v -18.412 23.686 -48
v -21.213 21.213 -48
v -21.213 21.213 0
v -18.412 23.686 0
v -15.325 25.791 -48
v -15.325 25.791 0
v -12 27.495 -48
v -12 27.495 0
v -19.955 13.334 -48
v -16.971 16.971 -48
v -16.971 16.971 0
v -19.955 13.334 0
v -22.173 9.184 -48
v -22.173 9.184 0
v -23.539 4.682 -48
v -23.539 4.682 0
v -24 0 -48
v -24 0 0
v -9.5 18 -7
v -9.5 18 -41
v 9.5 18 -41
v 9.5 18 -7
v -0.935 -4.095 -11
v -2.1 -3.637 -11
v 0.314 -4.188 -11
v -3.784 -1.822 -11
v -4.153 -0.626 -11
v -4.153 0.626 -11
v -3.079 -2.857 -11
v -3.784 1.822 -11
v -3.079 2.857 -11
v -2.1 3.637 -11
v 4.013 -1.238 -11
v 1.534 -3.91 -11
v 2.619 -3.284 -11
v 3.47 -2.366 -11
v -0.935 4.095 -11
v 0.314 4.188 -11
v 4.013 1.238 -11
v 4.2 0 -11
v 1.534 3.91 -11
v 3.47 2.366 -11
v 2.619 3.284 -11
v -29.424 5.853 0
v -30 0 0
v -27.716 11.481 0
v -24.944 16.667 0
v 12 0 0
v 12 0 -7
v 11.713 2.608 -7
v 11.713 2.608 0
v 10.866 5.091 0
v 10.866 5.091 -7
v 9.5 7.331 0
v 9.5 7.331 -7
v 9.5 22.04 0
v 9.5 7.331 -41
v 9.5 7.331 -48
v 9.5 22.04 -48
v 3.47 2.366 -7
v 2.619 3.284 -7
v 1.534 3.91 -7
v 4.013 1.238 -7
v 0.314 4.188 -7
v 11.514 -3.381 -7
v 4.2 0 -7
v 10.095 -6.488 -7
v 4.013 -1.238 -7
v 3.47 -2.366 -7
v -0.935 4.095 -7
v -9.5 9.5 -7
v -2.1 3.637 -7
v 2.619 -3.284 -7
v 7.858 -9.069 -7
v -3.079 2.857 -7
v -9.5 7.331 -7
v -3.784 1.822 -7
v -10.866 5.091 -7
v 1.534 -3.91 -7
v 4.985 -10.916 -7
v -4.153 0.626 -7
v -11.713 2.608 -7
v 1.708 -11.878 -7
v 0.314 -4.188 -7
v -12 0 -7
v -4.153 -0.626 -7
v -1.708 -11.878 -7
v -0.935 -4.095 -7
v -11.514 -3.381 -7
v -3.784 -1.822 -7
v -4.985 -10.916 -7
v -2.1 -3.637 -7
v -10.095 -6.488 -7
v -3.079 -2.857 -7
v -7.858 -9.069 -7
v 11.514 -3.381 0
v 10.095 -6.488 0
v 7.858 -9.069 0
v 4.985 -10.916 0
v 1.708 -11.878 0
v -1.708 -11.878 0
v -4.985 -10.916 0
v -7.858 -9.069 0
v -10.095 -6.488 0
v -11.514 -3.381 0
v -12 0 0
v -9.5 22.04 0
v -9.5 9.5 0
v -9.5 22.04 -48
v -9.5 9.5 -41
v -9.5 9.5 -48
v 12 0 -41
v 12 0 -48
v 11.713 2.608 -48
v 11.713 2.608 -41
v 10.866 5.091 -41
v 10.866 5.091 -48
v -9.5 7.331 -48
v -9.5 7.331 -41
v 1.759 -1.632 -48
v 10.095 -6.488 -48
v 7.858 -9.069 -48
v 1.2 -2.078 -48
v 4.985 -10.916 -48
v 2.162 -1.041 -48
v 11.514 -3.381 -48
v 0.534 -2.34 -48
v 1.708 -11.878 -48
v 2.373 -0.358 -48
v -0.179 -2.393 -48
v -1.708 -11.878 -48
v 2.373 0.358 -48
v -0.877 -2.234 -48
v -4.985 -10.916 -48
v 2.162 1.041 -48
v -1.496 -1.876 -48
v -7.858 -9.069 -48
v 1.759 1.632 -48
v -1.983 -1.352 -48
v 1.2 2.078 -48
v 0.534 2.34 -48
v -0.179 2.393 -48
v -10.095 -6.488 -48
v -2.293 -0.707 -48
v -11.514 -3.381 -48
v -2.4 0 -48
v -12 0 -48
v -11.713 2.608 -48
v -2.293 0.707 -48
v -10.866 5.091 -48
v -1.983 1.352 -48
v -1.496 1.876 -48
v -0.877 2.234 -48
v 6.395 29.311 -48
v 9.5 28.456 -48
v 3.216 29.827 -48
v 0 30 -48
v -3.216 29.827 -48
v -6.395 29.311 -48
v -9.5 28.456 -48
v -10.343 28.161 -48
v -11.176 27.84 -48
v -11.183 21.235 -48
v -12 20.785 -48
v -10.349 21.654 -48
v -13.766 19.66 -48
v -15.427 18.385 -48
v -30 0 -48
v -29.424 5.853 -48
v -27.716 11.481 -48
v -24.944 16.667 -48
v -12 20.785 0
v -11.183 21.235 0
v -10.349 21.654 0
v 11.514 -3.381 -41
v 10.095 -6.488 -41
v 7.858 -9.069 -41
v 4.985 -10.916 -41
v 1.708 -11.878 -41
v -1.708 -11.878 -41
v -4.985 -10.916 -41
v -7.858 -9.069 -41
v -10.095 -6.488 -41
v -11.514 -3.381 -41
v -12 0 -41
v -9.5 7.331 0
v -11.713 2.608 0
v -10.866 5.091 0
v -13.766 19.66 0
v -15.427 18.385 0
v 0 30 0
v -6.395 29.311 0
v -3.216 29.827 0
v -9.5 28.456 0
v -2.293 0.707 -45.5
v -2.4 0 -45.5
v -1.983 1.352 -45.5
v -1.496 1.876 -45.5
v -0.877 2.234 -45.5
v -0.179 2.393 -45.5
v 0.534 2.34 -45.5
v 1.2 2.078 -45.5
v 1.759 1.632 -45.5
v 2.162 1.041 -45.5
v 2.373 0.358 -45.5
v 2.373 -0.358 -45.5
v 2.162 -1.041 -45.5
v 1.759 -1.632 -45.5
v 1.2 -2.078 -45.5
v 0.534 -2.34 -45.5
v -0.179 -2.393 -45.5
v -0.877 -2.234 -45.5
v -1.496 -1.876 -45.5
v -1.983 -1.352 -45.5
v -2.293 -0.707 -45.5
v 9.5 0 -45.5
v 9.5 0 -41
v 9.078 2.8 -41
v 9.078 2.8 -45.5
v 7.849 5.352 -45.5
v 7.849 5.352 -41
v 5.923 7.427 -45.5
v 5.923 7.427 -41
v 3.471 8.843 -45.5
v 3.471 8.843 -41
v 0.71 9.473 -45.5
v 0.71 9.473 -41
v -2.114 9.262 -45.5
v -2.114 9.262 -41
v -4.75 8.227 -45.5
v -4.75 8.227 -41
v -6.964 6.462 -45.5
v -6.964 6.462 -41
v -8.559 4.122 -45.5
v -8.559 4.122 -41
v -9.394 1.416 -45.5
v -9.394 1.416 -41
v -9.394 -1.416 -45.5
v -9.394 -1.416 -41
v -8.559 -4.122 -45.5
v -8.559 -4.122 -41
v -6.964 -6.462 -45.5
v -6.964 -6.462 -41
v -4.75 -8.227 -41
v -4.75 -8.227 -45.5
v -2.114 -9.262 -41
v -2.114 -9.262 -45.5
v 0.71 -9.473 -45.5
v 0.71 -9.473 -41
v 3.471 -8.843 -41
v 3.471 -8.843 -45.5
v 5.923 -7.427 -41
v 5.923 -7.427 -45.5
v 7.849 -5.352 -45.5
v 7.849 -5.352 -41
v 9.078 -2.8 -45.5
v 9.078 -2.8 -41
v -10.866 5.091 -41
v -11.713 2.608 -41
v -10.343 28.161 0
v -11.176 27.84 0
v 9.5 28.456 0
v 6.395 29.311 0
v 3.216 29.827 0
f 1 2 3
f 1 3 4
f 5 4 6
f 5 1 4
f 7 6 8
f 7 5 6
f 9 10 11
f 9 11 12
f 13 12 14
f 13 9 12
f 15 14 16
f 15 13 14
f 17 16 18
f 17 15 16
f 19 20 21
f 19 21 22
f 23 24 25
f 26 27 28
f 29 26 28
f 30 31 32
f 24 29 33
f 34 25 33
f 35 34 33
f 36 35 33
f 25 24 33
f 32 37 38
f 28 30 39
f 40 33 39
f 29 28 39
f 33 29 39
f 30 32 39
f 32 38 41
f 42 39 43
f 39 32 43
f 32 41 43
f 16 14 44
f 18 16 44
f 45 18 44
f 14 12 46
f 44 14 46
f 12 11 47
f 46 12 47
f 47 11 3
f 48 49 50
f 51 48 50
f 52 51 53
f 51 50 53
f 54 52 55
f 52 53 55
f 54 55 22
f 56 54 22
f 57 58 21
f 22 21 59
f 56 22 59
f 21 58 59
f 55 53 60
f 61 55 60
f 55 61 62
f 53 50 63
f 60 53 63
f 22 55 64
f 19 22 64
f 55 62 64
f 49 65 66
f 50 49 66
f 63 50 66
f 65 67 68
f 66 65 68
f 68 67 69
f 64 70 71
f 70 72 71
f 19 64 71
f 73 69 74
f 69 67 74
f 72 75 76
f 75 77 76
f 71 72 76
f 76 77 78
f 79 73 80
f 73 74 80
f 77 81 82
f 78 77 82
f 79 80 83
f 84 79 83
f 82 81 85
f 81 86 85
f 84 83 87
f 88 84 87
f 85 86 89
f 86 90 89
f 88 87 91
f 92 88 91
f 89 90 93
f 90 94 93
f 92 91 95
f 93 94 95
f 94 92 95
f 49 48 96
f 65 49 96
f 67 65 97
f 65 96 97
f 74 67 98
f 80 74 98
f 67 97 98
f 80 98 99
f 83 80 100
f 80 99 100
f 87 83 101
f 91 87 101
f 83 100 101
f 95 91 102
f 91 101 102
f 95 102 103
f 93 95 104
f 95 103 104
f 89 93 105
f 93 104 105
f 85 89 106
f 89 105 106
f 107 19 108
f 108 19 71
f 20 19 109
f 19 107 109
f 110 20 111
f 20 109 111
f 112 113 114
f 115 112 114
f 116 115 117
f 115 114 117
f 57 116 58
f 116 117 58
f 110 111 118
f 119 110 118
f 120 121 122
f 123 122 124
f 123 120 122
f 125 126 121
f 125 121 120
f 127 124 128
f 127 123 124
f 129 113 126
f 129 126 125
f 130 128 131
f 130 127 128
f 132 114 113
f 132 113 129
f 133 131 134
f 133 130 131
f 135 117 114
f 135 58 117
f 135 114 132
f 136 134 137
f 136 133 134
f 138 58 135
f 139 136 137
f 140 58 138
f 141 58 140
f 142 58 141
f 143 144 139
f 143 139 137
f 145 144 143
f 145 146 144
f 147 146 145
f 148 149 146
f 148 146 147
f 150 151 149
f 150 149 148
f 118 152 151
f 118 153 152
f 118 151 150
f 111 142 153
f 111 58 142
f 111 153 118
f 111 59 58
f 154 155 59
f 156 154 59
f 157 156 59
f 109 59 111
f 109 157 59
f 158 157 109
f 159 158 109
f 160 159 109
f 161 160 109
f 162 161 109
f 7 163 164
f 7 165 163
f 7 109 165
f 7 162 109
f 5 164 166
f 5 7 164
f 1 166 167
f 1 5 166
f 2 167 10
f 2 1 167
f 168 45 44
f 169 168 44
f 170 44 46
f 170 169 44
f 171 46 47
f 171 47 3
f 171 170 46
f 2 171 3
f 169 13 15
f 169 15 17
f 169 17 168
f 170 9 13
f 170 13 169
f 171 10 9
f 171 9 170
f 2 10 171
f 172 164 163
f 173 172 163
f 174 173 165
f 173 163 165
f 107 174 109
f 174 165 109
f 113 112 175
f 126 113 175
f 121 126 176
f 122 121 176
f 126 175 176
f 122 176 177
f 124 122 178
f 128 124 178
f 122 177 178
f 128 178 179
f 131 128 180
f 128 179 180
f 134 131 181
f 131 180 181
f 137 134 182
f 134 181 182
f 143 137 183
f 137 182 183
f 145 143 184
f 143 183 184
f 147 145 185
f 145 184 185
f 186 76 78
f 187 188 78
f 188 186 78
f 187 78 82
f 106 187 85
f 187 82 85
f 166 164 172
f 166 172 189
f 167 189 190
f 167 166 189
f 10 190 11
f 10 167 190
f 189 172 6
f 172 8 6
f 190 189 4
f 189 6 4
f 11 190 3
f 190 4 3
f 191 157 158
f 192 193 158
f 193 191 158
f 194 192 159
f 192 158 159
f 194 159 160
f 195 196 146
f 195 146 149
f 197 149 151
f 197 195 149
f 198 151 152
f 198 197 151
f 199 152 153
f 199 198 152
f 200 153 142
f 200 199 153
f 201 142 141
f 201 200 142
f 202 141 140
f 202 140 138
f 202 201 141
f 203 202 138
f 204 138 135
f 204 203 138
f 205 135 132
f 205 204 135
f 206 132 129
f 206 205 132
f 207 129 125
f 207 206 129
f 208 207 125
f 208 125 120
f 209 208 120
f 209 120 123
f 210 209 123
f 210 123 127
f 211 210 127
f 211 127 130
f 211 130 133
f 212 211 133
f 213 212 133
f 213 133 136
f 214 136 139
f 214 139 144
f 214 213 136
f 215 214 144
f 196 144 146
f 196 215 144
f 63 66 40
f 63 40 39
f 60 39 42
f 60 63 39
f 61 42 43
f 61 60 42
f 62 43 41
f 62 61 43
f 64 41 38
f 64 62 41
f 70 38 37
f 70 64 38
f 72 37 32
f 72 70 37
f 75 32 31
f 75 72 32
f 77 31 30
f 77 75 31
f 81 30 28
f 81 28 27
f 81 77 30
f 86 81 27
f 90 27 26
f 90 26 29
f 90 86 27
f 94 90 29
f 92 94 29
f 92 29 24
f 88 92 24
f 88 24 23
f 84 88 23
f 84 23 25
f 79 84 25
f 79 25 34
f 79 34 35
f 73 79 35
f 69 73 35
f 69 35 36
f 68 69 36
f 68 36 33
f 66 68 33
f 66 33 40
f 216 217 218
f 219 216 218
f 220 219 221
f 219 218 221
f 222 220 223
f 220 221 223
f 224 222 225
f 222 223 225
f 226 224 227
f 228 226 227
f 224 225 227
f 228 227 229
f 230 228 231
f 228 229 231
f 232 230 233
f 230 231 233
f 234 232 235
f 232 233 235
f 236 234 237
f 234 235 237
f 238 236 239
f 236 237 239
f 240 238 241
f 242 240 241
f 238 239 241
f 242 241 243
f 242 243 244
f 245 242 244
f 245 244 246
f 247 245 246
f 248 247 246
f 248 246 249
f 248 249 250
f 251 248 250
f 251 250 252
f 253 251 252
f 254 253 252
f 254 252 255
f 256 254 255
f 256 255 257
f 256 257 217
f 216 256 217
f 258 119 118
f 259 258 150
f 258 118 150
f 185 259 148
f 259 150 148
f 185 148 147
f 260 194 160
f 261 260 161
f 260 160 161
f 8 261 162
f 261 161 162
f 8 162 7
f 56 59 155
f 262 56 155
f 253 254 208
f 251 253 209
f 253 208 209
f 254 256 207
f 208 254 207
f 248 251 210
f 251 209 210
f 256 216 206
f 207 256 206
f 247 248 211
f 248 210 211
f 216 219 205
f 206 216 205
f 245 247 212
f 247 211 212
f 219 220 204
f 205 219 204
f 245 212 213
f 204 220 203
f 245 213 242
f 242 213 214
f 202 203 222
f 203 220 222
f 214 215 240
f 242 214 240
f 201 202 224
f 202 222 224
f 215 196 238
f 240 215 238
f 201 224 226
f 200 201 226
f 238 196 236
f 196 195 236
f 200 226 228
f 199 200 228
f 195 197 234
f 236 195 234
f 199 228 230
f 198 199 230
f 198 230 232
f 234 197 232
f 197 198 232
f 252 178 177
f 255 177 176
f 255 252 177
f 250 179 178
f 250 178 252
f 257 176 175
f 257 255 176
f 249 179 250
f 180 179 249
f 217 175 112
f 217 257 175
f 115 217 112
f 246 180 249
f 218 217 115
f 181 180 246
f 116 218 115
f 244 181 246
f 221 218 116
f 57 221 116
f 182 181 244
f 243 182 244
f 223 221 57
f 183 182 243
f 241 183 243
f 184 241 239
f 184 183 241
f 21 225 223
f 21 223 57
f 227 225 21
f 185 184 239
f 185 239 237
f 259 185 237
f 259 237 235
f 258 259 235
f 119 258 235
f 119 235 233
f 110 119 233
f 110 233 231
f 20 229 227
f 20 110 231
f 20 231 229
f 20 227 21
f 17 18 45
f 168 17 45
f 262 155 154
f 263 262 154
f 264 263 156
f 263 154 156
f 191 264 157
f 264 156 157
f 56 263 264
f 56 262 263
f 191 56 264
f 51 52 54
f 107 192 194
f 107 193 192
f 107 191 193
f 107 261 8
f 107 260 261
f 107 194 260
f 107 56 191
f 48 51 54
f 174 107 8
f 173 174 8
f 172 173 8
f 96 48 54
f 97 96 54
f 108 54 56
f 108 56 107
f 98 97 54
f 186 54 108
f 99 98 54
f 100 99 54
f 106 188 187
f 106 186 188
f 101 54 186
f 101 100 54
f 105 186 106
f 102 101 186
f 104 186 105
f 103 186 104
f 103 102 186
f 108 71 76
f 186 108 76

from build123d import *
from build123d.topology import SkipClean

# Parameters (mm, degrees)
SKETCH1_R           = 9.5
BOSS_EXTRUDE1_DEPTH = 48
SKETCH2_W           = 34
SKETCH2_H           = 30
CUT_EXTRUDE1_DEPTH  = 62.481704596
BOSS_EXTRUDE2_START = -2.5
SKETCH3_R           = 9.5
SKETCH3_R_2         = 2.4
BOSS_EXTRUDE2_DEPTH = 2.5
SKETCH4_R           = 9.5
SKETCH4_R_2         = 4.2
BOSS_EXTRUDE3_DEPTH = 7
SKETCH5_R           = 4.2
BOSS_EXTRUDE4_DEPTH = 11
CUT_EXTRUDE2_DEPTH  = 58.861904566
BOSS_EXTRUDE5_DEPTH = 48


with BuildPart() as part:
    # Sketch1 → Boss-Extrude1 (new body)
    with BuildSketch(Plane.XY):
        with BuildLine():
            Line((-12, 0), (-12, 30))
            Line((-12, 30), (12, 30))
            Line((12, 30), (12, 0))
            ThreePointArc((12, 0), (0, -12), (-12, 0))
        make_face()
        Circle(SKETCH1_R, mode=Mode.SUBTRACT)
    extrude(amount=-BOSS_EXTRUDE1_DEPTH)

    # Sketch2 → Cut-Extrude1 (cut, through all)
    with BuildSketch(Plane.ZY.offset(12)):
        with Locations((-24, 3)):
            Rectangle(SKETCH2_W, SKETCH2_H)
    extrude(amount=-CUT_EXTRUDE1_DEPTH, mode=Mode.SUBTRACT)

    # Sketch3 → Boss-Extrude2 (add)
    with BuildSketch(Plane(origin=(0, 0, -48), x_dir=(-1, 0, 0), z_dir=(0, 0, -1)).offset(BOSS_EXTRUDE2_START)):
        Circle(SKETCH3_R)
        Circle(SKETCH3_R_2, mode=Mode.SUBTRACT)
    extrude(amount=BOSS_EXTRUDE2_DEPTH)

    # Sketch4 → Boss-Extrude3 (add)
    with BuildSketch(Plane.XY):
        with Locations(Location((0, 0, 0), (0, 0, 180))):
            Circle(SKETCH4_R)
        Circle(SKETCH4_R_2, mode=Mode.SUBTRACT)
    extrude(amount=-BOSS_EXTRUDE3_DEPTH)

    # Sketch5 → Boss-Extrude4 (add)
    with BuildSketch(Plane.XY):
        Circle(SKETCH5_R)
    extrude(amount=-BOSS_EXTRUDE4_DEPTH)

    # Sketch6 → Cut-Extrude2 (cut, through all)
    with SkipClean():  # the faces are left unmerged after this step: merging them gives an invalid solid
        with BuildSketch(Plane(origin=(0, 0, -48), x_dir=(-1, 0, 0), z_dir=(0, 0, -1))):
            with BuildLine():
                Line((-12, 30), (-12, 27.49545417))
                ThreePointArc((-12, 27.49545417), (-10.760725498, 28.003692377), (-9.5, 28.45610655))
                Line((-9.5, 28.45610655), (-9.5, 30))
                Line((-9.5, 30), (-12, 30))
            make_face()
            with BuildLine():
                Line((-9.5, 30), (-9.5, 28.45610655))
                ThreePointArc((-9.5, 28.45610655), (-4.812317696, 29.611511248), (2.9e-08, 30))
                Line((2.9e-08, 30), (-9.5, 30))
            make_face()
            with BuildLine():
                ThreePointArc((2.9e-08, 30), (4.812317725, 29.611511243), (9.5, 28.45610655))
                Line((9.5, 28.45610655), (9.5, 30))
                Line((9.5, 30), (2.9e-08, 30))
            make_face()
            with BuildLine():
                Line((9.5, 30), (9.5, 28.45610655))
                ThreePointArc((9.5, 28.45610655), (10.760725498, 28.003692377), (12, 27.49545417))
                Line((12, 27.49545417), (12, 30))
                Line((12, 30), (9.5, 30))
            make_face()
            with BuildLine():
                Line((-12, 20.784609691), (-12, 0))
                ThreePointArc((-12, 0), (-11.357816692, 3.872983346), (-9.5, 7.331439149))
                Line((-9.5, 7.331439149), (-9.5, 22.039736841))
                ThreePointArc((-9.5, 22.039736841), (-10.768302375, 21.448628487), (-12, 20.784609691))
            make_face()
            with BuildLine():
                Line((-12, 27.49545417), (-12, 20.784609691))
                ThreePointArc((-12, 20.784609691), (-10.768302375, 21.448628487), (-9.5, 22.039736841))
                Line((-9.5, 22.039736841), (-9.5, 28.45610655))
                ThreePointArc((-9.5, 28.45610655), (-10.760725498, 28.003692377), (-12, 27.49545417))
            make_face()
            with BuildLine():
                Line((9.5, 22.039736841), (9.5, 9.5))
                Line((9.5, 9.5), (12, 12))
                Line((12, 12), (12, 20.784609691))
                ThreePointArc((12, 20.784609691), (10.768302375, 21.448628487), (9.5, 22.039736841))
            make_face()
            with BuildLine():
                ThreePointArc((9.5, 7.331439149), (11.357816692, 3.872983346), (12, 0))
                Line((12, 0), (12, 12))
                Line((12, 12), (9.5, 9.5))
                Line((9.5, 9.5), (9.5, 7.331439149))
            make_face()
        extrude(amount=-CUT_EXTRUDE2_DEPTH, mode=Mode.SUBTRACT)

    # Sketch7 → Boss-Extrude5 (add)
    with SkipClean():  # the faces are left unmerged after this step: merging them gives an invalid solid
        with BuildSketch(Plane(origin=(0, 0, -48), x_dir=(-1, 0, 0), z_dir=(0, 0, -1))):
            with BuildLine():
                ThreePointArc((12, 20.784609691), (14.610274296, 19.040480167), (16.970562748, 16.970562748))
                Line((16.970562748, 16.970562748), (21.213203436, 21.213203436))
                ThreePointArc((21.213203436, 21.213203436), (16.901061777, 24.786167732), (12, 27.49545417))
                Line((12, 27.49545417), (12, 20.784609691))
            make_face()
            with BuildLine():
                ThreePointArc((16.970562748, 16.970562748), (22.17310878, 9.184402377), (24, 0))
                Line((24, 0), (30, 0))
                ThreePointArc((30, 0), (27.716385975, 11.480502971), (21.213203436, 21.213203436))
                Line((21.213203436, 21.213203436), (16.970562748, 16.970562748))
            make_face()
        extrude(amount=-BOSS_EXTRUDE5_DEPTH)


solid = part.part
